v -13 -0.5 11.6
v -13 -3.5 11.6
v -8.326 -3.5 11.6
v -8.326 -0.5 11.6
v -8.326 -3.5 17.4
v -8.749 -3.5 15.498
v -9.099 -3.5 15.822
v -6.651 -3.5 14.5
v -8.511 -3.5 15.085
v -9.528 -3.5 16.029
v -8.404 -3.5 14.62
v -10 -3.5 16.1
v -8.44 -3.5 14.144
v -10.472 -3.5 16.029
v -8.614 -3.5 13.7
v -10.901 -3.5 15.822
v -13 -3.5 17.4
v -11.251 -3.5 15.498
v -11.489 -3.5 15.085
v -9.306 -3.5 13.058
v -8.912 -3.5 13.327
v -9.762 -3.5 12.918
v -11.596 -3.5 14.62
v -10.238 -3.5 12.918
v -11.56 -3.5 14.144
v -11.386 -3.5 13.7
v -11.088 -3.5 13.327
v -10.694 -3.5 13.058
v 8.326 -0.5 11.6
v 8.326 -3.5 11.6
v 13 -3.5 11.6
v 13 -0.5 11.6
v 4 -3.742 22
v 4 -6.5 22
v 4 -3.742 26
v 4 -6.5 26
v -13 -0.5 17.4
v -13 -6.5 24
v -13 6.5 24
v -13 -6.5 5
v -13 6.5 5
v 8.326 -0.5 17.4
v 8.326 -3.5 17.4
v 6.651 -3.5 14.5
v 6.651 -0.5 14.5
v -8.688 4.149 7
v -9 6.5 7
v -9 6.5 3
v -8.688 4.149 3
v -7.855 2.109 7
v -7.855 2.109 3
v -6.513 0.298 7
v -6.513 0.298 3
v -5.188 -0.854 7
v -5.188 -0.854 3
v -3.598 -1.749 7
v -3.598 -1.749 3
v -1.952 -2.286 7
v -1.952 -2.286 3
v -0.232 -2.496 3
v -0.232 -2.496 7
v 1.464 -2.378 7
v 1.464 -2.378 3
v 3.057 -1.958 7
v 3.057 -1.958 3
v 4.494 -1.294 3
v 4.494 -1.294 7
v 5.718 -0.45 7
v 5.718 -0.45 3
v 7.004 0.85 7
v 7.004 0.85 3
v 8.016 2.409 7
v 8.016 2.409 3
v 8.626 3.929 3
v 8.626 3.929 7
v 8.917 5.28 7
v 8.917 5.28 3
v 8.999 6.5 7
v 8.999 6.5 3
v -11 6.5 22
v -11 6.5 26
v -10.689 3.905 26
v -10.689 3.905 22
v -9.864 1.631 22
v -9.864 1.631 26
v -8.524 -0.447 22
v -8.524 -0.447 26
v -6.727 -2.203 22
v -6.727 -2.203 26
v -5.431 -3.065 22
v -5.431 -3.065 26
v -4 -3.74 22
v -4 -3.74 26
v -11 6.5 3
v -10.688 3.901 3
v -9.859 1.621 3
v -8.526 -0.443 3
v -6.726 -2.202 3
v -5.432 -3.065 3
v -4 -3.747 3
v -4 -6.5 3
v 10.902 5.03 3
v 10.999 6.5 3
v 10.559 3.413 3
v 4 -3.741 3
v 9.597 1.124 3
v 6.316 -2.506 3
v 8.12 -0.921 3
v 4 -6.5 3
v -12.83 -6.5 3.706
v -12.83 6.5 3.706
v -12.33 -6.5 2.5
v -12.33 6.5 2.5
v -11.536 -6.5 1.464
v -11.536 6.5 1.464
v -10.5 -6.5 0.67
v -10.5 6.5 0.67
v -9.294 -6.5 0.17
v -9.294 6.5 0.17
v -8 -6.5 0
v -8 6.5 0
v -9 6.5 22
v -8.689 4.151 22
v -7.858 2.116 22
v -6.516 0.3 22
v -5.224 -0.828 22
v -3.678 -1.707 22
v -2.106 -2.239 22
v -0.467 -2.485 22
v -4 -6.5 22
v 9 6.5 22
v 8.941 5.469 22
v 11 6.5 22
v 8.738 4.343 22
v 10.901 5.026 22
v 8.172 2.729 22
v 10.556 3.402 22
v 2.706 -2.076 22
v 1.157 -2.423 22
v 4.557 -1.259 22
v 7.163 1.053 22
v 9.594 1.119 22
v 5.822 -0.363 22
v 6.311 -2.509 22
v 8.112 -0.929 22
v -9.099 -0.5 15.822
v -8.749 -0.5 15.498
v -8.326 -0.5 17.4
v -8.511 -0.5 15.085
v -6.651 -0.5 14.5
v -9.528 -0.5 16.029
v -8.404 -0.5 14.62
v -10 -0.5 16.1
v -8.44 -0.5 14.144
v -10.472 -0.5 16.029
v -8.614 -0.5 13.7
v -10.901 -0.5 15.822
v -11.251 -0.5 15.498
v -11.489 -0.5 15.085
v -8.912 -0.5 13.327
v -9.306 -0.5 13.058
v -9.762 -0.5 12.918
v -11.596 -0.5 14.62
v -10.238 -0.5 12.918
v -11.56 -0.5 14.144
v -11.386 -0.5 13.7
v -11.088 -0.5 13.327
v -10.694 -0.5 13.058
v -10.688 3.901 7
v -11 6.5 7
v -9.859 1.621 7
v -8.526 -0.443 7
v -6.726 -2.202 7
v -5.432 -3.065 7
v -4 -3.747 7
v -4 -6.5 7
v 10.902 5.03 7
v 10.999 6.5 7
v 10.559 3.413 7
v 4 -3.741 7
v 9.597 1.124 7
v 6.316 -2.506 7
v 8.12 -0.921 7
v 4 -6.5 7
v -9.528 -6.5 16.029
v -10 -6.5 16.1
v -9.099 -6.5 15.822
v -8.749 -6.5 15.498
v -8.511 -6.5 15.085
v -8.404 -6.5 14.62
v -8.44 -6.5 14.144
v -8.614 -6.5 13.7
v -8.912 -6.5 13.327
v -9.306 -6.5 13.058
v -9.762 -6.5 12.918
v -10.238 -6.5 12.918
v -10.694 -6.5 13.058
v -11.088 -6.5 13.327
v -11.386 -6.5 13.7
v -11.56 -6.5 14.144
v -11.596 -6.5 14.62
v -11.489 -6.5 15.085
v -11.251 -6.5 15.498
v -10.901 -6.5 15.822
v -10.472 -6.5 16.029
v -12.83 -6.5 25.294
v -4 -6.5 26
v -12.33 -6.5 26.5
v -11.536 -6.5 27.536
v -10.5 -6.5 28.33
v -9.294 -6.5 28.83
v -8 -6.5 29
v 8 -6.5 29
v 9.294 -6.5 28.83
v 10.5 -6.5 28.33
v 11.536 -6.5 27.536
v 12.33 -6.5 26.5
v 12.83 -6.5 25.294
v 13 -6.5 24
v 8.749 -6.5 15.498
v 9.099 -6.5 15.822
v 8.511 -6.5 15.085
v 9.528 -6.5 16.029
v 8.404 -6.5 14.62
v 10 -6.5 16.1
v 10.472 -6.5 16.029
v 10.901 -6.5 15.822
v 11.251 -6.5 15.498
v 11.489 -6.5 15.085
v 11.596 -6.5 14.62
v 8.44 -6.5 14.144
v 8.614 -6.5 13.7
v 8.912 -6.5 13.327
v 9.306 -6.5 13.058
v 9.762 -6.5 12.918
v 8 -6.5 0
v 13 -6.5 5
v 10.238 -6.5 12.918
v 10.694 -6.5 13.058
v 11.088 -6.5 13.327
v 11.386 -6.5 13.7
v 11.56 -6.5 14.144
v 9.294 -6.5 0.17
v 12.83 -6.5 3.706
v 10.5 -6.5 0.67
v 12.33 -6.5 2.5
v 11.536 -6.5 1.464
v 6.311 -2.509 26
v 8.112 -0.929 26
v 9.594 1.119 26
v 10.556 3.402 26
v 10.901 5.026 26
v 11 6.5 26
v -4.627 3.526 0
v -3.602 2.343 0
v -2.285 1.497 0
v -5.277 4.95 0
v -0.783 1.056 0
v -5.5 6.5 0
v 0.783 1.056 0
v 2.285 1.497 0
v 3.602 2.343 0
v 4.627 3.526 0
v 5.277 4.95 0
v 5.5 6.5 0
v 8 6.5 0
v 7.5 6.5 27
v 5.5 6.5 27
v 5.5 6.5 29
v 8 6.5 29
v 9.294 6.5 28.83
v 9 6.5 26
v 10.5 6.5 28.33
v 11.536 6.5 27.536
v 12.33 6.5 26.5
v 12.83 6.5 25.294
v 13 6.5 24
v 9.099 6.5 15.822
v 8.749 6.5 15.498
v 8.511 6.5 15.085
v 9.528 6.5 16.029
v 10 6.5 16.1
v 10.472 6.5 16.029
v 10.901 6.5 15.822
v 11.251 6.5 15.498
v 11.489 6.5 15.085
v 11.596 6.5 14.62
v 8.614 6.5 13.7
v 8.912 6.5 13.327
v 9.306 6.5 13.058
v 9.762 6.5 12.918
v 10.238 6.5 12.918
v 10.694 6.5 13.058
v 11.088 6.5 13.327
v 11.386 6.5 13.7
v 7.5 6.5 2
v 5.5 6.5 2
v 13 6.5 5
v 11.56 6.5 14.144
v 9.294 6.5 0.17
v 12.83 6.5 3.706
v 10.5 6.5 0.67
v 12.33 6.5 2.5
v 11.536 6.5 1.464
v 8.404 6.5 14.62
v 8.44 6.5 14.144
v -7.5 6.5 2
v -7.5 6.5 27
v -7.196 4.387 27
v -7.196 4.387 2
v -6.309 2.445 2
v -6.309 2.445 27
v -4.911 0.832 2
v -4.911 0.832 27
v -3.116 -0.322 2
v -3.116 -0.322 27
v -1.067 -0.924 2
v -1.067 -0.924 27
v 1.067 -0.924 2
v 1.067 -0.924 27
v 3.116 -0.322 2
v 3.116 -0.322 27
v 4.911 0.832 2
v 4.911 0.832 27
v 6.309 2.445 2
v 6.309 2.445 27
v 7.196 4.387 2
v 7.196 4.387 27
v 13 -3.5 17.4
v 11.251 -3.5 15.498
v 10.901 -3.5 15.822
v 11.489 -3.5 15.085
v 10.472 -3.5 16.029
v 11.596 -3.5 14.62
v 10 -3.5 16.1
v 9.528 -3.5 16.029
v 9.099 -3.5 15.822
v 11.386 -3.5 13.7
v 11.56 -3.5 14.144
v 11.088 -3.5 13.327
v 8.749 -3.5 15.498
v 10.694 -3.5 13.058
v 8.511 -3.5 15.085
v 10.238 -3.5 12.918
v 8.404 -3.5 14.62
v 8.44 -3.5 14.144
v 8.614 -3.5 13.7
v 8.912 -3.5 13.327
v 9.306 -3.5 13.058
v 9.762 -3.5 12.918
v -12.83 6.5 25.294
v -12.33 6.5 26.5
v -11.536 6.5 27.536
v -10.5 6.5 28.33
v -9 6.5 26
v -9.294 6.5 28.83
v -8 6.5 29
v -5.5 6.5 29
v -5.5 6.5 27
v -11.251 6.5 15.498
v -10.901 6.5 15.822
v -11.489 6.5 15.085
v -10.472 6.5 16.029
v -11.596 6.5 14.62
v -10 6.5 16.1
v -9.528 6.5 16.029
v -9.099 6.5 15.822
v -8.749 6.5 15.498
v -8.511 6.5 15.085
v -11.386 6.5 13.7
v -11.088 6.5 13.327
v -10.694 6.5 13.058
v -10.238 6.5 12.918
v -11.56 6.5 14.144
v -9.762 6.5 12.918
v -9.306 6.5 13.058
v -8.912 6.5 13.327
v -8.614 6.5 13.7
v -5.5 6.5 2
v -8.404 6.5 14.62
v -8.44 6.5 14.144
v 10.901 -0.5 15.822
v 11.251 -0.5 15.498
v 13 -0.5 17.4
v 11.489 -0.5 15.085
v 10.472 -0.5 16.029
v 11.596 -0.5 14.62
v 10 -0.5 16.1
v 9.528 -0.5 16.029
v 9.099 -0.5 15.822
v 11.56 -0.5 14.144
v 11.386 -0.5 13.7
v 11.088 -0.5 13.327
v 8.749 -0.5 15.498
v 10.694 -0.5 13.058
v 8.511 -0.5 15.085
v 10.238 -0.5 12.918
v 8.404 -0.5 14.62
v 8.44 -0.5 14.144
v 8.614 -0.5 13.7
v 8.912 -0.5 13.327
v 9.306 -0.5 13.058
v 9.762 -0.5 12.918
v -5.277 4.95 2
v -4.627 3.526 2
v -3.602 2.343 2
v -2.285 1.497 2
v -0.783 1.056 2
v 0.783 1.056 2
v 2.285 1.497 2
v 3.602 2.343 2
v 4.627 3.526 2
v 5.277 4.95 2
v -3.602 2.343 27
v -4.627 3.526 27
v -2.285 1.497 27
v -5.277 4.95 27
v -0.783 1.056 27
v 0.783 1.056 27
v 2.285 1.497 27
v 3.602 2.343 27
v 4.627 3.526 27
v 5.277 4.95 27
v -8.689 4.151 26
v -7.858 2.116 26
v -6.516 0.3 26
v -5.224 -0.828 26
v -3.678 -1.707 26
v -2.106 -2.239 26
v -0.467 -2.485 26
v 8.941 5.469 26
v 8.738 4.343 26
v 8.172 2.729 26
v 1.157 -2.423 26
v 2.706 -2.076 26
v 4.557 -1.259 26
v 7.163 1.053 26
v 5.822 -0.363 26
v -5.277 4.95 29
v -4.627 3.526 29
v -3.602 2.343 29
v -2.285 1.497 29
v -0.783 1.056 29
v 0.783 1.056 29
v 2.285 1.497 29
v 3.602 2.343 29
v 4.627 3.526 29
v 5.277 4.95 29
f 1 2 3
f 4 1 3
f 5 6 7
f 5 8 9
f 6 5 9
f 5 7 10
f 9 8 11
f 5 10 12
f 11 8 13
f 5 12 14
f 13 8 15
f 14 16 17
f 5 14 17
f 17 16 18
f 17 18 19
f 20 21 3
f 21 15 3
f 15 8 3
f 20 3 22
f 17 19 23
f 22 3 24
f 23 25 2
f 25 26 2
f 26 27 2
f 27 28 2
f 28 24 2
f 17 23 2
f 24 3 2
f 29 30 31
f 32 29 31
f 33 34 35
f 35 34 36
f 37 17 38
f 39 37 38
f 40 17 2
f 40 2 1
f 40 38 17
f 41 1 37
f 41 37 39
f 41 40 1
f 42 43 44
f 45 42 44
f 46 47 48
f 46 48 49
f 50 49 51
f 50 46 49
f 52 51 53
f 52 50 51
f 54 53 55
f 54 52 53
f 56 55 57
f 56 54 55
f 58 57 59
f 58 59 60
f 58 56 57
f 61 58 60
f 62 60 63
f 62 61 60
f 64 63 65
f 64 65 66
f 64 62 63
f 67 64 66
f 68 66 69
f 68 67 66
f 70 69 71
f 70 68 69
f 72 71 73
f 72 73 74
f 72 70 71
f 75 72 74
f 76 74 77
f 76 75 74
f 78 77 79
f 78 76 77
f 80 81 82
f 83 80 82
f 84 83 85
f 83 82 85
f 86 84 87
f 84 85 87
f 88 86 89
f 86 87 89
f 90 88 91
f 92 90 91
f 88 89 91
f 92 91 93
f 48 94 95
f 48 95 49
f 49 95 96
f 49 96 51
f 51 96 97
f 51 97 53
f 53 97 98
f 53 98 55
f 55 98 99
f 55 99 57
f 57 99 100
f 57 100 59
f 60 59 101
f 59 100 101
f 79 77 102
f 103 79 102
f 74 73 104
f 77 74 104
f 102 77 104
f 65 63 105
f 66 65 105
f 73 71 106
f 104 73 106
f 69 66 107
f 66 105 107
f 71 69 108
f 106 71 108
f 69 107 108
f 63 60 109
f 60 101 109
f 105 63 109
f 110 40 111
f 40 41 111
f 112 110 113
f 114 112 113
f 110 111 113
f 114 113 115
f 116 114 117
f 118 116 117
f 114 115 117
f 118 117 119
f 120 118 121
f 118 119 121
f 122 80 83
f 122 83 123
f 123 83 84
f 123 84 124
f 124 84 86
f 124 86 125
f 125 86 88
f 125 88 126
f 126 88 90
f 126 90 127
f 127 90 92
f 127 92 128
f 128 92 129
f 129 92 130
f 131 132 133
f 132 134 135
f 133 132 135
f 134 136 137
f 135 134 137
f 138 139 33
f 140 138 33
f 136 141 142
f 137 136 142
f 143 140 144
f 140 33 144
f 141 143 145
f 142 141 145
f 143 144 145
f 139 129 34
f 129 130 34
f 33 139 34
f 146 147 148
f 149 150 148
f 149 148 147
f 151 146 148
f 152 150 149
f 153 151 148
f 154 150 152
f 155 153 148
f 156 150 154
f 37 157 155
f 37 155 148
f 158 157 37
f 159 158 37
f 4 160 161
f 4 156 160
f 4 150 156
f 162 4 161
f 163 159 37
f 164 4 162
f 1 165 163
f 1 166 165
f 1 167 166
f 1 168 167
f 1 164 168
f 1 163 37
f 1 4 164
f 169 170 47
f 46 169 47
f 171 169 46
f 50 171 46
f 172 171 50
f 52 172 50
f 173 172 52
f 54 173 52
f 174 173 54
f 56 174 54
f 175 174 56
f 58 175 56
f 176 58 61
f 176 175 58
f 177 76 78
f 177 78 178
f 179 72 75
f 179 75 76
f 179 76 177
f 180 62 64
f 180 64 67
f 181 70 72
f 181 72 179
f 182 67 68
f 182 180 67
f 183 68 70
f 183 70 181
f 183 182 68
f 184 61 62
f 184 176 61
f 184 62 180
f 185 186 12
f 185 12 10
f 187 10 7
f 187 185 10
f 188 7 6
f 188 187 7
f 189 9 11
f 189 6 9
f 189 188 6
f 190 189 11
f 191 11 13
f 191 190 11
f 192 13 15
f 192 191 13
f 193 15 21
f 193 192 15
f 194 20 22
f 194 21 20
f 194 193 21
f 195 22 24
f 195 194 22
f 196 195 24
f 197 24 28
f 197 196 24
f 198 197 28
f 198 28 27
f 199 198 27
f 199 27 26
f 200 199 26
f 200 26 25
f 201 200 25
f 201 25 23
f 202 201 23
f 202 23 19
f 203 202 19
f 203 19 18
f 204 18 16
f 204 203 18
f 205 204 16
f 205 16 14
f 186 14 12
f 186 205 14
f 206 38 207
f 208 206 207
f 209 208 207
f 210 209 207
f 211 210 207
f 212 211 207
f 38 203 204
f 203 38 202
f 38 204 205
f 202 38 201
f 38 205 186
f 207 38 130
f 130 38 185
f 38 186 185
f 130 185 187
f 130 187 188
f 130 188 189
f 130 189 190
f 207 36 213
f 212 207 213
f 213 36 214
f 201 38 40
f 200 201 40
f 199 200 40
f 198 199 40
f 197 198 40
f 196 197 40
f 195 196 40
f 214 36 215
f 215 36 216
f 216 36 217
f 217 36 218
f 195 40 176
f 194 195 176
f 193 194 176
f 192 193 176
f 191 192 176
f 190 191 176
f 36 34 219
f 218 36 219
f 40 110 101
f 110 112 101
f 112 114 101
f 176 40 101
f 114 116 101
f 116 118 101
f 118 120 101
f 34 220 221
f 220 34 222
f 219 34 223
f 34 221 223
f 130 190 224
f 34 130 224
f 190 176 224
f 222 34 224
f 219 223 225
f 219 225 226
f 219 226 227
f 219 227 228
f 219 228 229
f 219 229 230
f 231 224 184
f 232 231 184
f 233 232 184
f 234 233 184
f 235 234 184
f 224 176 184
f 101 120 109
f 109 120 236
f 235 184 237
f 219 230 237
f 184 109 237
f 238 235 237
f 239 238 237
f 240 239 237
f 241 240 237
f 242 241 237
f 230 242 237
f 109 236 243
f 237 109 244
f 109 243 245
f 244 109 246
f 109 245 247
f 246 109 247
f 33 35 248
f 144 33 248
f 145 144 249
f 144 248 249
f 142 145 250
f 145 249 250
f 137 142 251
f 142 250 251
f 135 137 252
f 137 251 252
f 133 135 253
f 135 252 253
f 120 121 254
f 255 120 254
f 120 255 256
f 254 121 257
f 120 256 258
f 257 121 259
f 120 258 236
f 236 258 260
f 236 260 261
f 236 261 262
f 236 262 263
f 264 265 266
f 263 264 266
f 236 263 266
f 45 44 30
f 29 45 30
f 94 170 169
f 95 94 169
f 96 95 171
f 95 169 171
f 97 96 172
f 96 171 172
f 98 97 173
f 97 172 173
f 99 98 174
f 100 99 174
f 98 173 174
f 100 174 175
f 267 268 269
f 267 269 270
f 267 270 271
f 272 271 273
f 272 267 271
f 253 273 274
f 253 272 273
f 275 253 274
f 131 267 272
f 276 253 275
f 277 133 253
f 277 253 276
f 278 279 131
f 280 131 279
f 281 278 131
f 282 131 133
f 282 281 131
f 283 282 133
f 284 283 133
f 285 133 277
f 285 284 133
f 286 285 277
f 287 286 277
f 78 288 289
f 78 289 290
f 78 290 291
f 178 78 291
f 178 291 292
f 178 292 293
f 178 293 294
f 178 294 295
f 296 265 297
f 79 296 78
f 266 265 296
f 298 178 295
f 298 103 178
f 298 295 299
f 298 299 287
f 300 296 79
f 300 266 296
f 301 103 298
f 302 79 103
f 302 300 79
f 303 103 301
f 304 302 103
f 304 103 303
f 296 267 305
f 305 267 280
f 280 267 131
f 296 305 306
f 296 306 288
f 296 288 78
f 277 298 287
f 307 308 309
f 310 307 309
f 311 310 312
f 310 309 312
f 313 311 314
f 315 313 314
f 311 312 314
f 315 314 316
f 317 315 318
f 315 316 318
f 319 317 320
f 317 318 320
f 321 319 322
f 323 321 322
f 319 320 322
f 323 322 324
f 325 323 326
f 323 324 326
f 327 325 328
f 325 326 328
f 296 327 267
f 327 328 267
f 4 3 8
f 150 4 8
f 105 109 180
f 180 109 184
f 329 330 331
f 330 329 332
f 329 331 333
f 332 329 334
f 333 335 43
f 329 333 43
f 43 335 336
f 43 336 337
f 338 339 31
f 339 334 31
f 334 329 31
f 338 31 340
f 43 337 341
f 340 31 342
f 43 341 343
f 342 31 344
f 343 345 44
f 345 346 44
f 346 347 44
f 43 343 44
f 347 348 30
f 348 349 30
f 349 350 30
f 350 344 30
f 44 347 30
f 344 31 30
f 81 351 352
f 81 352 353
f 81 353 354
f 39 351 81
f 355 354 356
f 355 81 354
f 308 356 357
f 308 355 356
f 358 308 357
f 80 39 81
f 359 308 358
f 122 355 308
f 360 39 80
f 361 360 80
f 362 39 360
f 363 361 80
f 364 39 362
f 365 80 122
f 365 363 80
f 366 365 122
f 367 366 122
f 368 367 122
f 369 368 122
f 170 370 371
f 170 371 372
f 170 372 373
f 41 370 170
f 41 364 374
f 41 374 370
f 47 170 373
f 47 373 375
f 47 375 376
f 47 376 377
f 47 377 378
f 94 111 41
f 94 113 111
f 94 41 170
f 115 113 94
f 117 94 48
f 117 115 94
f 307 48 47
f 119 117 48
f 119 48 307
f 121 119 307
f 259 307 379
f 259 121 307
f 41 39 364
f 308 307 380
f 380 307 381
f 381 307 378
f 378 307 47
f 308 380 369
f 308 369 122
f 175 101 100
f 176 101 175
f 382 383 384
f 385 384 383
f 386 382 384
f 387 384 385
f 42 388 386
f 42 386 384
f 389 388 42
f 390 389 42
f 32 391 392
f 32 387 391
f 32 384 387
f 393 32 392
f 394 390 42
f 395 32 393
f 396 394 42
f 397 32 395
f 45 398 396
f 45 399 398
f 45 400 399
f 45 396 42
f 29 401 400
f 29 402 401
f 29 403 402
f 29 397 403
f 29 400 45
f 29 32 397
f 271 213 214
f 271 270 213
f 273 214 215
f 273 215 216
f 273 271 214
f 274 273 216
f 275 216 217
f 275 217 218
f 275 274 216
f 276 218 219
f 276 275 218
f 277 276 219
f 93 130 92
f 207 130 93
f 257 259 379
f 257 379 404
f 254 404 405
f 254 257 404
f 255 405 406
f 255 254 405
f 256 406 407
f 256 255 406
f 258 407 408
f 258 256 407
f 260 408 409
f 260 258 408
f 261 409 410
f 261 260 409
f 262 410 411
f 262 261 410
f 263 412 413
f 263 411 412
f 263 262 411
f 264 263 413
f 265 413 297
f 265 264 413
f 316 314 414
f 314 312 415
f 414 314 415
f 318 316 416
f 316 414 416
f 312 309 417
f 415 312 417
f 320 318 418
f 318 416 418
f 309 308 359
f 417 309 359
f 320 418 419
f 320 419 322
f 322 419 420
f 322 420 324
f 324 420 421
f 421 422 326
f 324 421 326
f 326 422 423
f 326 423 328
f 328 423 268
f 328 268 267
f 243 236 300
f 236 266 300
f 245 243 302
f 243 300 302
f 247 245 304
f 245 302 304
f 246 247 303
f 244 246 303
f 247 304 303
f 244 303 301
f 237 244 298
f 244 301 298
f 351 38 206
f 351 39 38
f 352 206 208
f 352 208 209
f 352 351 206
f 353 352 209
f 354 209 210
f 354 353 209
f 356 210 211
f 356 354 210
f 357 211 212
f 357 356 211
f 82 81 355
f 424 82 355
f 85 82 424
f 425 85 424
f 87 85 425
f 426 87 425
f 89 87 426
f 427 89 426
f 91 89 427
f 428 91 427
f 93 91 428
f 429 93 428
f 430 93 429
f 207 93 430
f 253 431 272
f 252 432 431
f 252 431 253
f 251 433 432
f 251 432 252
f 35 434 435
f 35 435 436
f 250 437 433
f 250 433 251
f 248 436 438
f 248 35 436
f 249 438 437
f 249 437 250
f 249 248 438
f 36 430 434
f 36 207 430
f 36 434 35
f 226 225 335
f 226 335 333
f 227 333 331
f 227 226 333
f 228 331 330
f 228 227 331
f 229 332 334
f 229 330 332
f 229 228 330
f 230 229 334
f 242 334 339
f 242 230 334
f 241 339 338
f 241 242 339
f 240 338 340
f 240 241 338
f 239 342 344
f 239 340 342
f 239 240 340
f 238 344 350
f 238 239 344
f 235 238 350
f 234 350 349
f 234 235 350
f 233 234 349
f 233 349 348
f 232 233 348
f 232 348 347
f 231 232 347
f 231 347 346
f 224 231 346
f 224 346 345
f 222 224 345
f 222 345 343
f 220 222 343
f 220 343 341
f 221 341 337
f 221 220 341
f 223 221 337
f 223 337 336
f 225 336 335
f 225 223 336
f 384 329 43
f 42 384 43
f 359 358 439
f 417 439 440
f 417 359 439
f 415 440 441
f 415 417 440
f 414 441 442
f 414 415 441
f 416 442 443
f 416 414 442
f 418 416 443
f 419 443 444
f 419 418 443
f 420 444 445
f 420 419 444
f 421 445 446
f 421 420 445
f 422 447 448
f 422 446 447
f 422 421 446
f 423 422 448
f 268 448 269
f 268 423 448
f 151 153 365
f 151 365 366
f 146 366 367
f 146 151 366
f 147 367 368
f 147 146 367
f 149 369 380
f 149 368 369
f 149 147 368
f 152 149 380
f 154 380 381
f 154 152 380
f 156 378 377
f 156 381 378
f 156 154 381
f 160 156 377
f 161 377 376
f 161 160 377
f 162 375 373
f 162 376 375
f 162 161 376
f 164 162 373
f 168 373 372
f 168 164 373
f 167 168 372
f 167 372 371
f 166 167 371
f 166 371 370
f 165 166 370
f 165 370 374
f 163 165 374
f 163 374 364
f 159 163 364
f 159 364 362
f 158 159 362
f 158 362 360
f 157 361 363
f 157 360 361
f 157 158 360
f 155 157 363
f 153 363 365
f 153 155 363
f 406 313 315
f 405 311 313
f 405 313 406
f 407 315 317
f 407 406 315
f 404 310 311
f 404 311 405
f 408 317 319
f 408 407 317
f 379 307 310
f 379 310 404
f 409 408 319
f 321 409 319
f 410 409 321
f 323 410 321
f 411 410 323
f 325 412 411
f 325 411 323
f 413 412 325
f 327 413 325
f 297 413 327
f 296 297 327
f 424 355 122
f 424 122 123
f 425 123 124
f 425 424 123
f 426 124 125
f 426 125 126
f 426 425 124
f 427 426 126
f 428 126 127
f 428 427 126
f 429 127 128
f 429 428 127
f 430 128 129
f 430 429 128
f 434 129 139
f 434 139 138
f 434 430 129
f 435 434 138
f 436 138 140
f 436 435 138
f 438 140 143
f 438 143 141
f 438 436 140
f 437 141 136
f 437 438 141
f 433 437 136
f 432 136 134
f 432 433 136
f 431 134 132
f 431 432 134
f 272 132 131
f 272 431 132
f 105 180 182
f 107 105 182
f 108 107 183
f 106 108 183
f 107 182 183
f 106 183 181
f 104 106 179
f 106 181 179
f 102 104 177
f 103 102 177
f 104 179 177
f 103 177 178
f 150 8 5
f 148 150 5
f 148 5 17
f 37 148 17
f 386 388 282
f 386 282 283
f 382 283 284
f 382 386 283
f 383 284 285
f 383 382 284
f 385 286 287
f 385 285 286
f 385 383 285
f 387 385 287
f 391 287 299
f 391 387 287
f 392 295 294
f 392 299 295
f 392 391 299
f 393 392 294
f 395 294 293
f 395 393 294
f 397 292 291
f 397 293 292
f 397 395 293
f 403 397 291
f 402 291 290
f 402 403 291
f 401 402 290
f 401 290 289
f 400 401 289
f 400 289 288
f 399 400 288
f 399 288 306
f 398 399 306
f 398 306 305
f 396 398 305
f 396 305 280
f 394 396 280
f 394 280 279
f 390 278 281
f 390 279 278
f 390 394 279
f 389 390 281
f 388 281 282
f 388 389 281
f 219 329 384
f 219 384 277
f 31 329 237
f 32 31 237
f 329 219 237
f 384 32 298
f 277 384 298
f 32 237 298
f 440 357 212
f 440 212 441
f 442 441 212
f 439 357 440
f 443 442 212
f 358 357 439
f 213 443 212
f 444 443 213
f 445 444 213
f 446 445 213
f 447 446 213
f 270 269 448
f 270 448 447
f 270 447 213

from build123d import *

# Parameters (mm, degrees)
ESBO_O1_W                  = 26
ESBO_O1_H                  = 13
RESSALTO_EXTRUS_O1_DEPTH   = 29
CORTE_EXTRUS_O1_DEPTH      = 33.438403167
CORTE_EXTRUS_O1_DEPTH_BACK = 33.438403167
ESBO_O2_R                  = 5.5
ESBO_O3_R                  = 7.5
CORTE_EXTRUS_O2_DEPTH      = 25
CORTE_EXTRUS_O3_DEPTH      = 35.336569427
CORTE_EXTRUS_O3_DEPTH_BACK = 35.336569427
ESBO_O4_R                  = 1.6
CORTE_EXTRUS_O4_DEPTH      = 3
ESBO_O9_W                  = 8
ESBO_O9_H                  = 4
CORTE_EXTRUS_O5_DEPTH      = 3
FILETE1_R                  = 5


with BuildPart() as part:
    # Esboço1 → Ressalto-extrusão1 (new body)
    with BuildSketch(Plane.XY):
        Rectangle(ESBO_O1_W, ESBO_O1_H)
    extrude(amount=RESSALTO_EXTRUS_O1_DEPTH)

    # Esboço2 → Corte-extrusão1 (cut, two sides: drawn at the far end of the back side and taken through both)
    with BuildSketch(Plane.XY.offset(29).offset(-CORTE_EXTRUS_O1_DEPTH_BACK)):
        with Locations((0, 6.5)):
            Circle(ESBO_O2_R)
    extrude(amount=CORTE_EXTRUS_O1_DEPTH + CORTE_EXTRUS_O1_DEPTH_BACK, mode=Mode.SUBTRACT)

    # Esboço3 → Corte-extrusão2 (cut)
    with BuildSketch(Plane.XY.offset(27)):
        with Locations((0, 6.5)):
            Circle(ESBO_O3_R)
    extrude(amount=-CORTE_EXTRUS_O2_DEPTH, mode=Mode.SUBTRACT)

    # Esboço4 → Corte-extrusão3 (cut, two sides: drawn at the far end of the back side and taken through both)
    with BuildSketch(Plane(origin=(0, 6.5, 0), x_dir=(1, 0, 0), z_dir=(0, 1, 0)).offset(-CORTE_EXTRUS_O3_DEPTH_BACK)):
        with Locations(Location((-10, -14.5, 0), (0, 0, 270))):
            Circle(ESBO_O4_R)
        with Locations(Location((10, -14.5, 0), (0, 0, 270))):
            Circle(ESBO_O4_R)
    extrude(amount=CORTE_EXTRUS_O3_DEPTH + CORTE_EXTRUS_O3_DEPTH_BACK, mode=Mode.SUBTRACT)

    # Varredura de corte3: read off the stored shape, not the designer's step
    # Varredura de corte3: loft between two sections, ruled curve by curve
    varredura_de_corte3_from = [
        Edge.make_bspline([(-10.775531387, 11.14102753, 3), (-10.815047893, 10.387007675, 3), (-10.859579119, 9.537232339, 3), (-10.942482774, 7.955474229, 3), (-11.000003483, 7.230191203, 3), (-10.999993175, 5.06927711, 3), (-10.717078713, 3.385508213, 3), (-9.067866438, -0.006108266, 3), (-7.679635371, -1.685716419, 3), (-4.830903728, -3.44525385, 3), (-3.774716833, -3.895333549, 3), (-1.552511027, -4.449938605, 3), (-0.403453822, -4.550209028, 3), (2.969944564, -4.328615808, 3), (5.023571546, -3.476580102, 3), (8.13506471, -1.154366891, 3), (9.189674801, 0.267167465, 3), (10.533085234, 2.985384839, 3), (10.837160801, 4.285623822, 3), (11.004780041, 6.01871971, 3), (11.006990461, 6.575860832, 3), (10.96949773, 7.517101654, 3), (10.943022714, 7.945129378, 3), (10.873144208, 9.27841043, 3), (10.824758408, 10.201720017, 3), (10.775531387, 11.14102753, 3)], [0, 0, 0, 0, 0.056576928, 0.056576928, 0.113153857, 0.113153857, 0.224009625, 0.224009625, 0.334865393, 0.334865393, 0.390293276, 0.390293276, 0.44572116, 0.44572116, 0.556576928, 0.556576928, 0.667432696, 0.667432696, 0.778288464, 0.778288464, 0.833716348, 0.833716348, 0.889144232, 0.889144232, 1, 1, 1, 1], 3),
        Edge.make_bspline([(-8.778272317, 11.036355618, 3), (-8.818366558, 10.271311923, 3), (-8.86155068, 9.447238277, 3), (-8.945993073, 7.836124466, 3), (-9.000002401, 7.107268908, 3), (-8.999995296, 5.310128738, 3), (-8.764237068, 3.942975251, 3), (-7.423445328, 1.185624705, 3), (-6.27357029, -0.203437636, 3), (-3.957441466, -1.63400923, 3), (-3.084493861, -2.006248941, 3), (-1.274147115, -2.45806464, 3), (-0.32387933, -2.540671478, 3), (2.417516141, -2.360593842, 3), (4.119219834, -1.655921663, 3), (6.646937102, 0.230601396, 3), (7.51801706, 1.398774697, 3), (8.618786605, 3.626040825, 3), (8.867342653, 4.694186327, 3), (9.003623581, 6.103250891, 3), (9.006690622, 6.5435831, 3), (8.972969022, 7.390126226, 3), (8.946060492, 7.834793966, 3), (8.875291444, 9.185065517, 3), (8.82794518, 10.088540932, 3), (8.778272317, 11.036355618, 3)], [0, 0, 0, 0, 0.056576928, 0.056576928, 0.113153857, 0.113153857, 0.224009625, 0.224009625, 0.334865393, 0.334865393, 0.390293276, 0.390293276, 0.44572116, 0.44572116, 0.556576928, 0.556576928, 0.667432696, 0.667432696, 0.778288464, 0.778288464, 0.833716348, 0.833716348, 0.889144232, 0.889144232, 1, 1, 1, 1], 3),
        Edge.make_line((-8.778272317, 11.036355618, 3), (-10.775531387, 11.14102753, 3)),
        Edge.make_line((8.778272317, 11.036355618, 3), (10.775531387, 11.14102753, 3)),
    ]
    varredura_de_corte3_to = [
        Edge.make_bspline([(-10.775531387, 11.14102753, 7), (-10.815047893, 10.387007675, 7), (-10.859579119, 9.537232339, 7), (-10.942482774, 7.955474229, 7), (-11.000003483, 7.230191203, 7), (-10.999993175, 5.06927711, 7), (-10.717078713, 3.385508213, 7), (-9.067866438, -0.006108266, 7), (-7.679635371, -1.685716419, 7), (-4.830903728, -3.44525385, 7), (-3.774716833, -3.895333549, 7), (-1.552511027, -4.449938605, 7), (-0.403453822, -4.550209028, 7), (2.969944564, -4.328615808, 7), (5.023571546, -3.476580102, 7), (8.13506471, -1.154366891, 7), (9.189674801, 0.267167465, 7), (10.533085234, 2.985384839, 7), (10.837160801, 4.285623822, 7), (11.004780041, 6.01871971, 7), (11.006990461, 6.575860832, 7), (10.96949773, 7.517101654, 7), (10.943022714, 7.945129378, 7), (10.873144208, 9.27841043, 7), (10.824758408, 10.201720017, 7), (10.775531387, 11.14102753, 7)], [0, 0, 0, 0, 0.056576928, 0.056576928, 0.113153857, 0.113153857, 0.224009625, 0.224009625, 0.334865393, 0.334865393, 0.390293276, 0.390293276, 0.44572116, 0.44572116, 0.556576928, 0.556576928, 0.667432696, 0.667432696, 0.778288464, 0.778288464, 0.833716348, 0.833716348, 0.889144232, 0.889144232, 1, 1, 1, 1], 3),
        Edge.make_bspline([(-8.778272317, 11.036355618, 7), (-8.818366558, 10.271311923, 7), (-8.86155068, 9.447238277, 7), (-8.945993073, 7.836124466, 7), (-9.000002401, 7.107268908, 7), (-8.999995296, 5.310128738, 7), (-8.764237068, 3.942975251, 7), (-7.423445328, 1.185624705, 7), (-6.27357029, -0.203437636, 7), (-3.957441466, -1.63400923, 7), (-3.084493861, -2.006248941, 7), (-1.274147115, -2.45806464, 7), (-0.32387933, -2.540671478, 7), (2.417516141, -2.360593842, 7), (4.119219834, -1.655921663, 7), (6.646937102, 0.230601396, 7), (7.51801706, 1.398774697, 7), (8.618786605, 3.626040825, 7), (8.867342653, 4.694186327, 7), (9.003623581, 6.103250891, 7), (9.006690622, 6.5435831, 7), (8.972969022, 7.390126226, 7), (8.946060492, 7.834793966, 7), (8.875291444, 9.185065517, 7), (8.82794518, 10.088540932, 7), (8.778272317, 11.036355618, 7)], [0, 0, 0, 0, 0.056576928, 0.056576928, 0.113153857, 0.113153857, 0.224009625, 0.224009625, 0.334865393, 0.334865393, 0.390293276, 0.390293276, 0.44572116, 0.44572116, 0.556576928, 0.556576928, 0.667432696, 0.667432696, 0.778288464, 0.778288464, 0.833716348, 0.833716348, 0.889144232, 0.889144232, 1, 1, 1, 1], 3),
        Edge.make_line((-8.778272317, 11.036355618, 7), (-10.775531387, 11.14102753, 7)),
        Edge.make_line((8.778272317, 11.036355618, 7), (10.775531387, 11.14102753, 7)),
    ]
    varredura_de_corte3 = Solid(Shell([*[Face.make_surface_from_curves(varredura_de_corte3_from[k], varredura_de_corte3_to[k]) for k in range(4)], Face(Wire(varredura_de_corte3_from)), Face(Wire(varredura_de_corte3_to))]))
    add(varredura_de_corte3, mode=Mode.SUBTRACT)

    # Varredura de corte3 2: loft between two sections, ruled curve by curve
    varredura_de_corte3_2_from = [
        Edge.make_bspline([(-10.775531387, 11.14102753, 22), (-10.815050253, 10.386962648, 22), (-10.859635544, 9.536156226, 22), (-10.942604964, 7.953142141, 22), (-11.000003387, 7.227604876, 22), (-10.999993448, 5.09243912, 22), (-10.726075216, 3.44374676, 22), (-9.146415207, 0.117814577, 22), (-7.826638231, -1.531050563, 22), (-4.171497206, -3.909251659, 22), (-1.912358031, -4.556779213, 22), (2.517456834, -4.434897746, 22), (4.570919991, -3.689422793, 22), (7.764052722, -1.527285148, 22), (8.887440792, -0.158899703, 22), (10.364225069, 2.511206921, 22), (10.732123337, 3.816518914, 22), (10.975605623, 5.5614094, 22), (11.004902153, 6.119453759, 22), (10.993656399, 7.13678057, 22), (10.963259766, 7.559009248, 22), (10.895302463, 8.855554069, 22), (10.847393897, 9.769809145, 22), (10.799382035, 10.685930053, 22)], [0, 0, 0, 0, 0.057220999, 0.057220999, 0.114441998, 0.114441998, 0.225136749, 0.225136749, 0.335831499, 0.335831499, 0.446526249, 0.446526249, 0.557220999, 0.557220999, 0.667915749, 0.667915749, 0.7786105, 0.7786105, 0.833957875, 0.833957875, 0.88930525, 0.88930525, 1, 1, 1, 1], 3),
        Edge.make_bspline([(-8.778272317, 11.036355618, 22), (-8.818364203, 10.271356871, 22), (-8.861613386, 9.446042366, 22), (-8.946108983, 7.833912176, 22), (-9.000002332, 7.104831646, 22), (-8.999995488, 5.329945493, 22), (-8.772011309, 3.991285732, 22), (-7.487299037, 1.286355363, 22), (-6.385007619, -0.082964565, 22), (-3.431648648, -2.004555434, 22), (-1.541287594, -2.5458131, 22), (2.036368433, -2.447377138, 22), (3.749427608, -1.830311698, 22), (6.342822793, -0.074267526, 22), (7.271131746, 1.051066146, 22), (8.480231231, 3.237185214, 22), (8.780527991, 4.302274211, 22), (8.980191062, 5.733137414, 22), (9.004131059, 6.178194136, 22), (8.994672137, 7.033801275, 22), (8.966591972, 7.443057915, 22), (8.896860843, 8.773440999, 22), (8.851022767, 9.64819435, 22), (8.802122965, 10.58125814, 22)], [0, 0, 0, 0, 0.057220999, 0.057220999, 0.114441998, 0.114441998, 0.225136749, 0.225136749, 0.335831499, 0.335831499, 0.446526249, 0.446526249, 0.557220999, 0.557220999, 0.667915749, 0.667915749, 0.7786105, 0.7786105, 0.833957875, 0.833957875, 0.88930525, 0.88930525, 1, 1, 1, 1], 3),
        Edge.make_line((-8.778272317, 11.036355618, 22), (-10.775531387, 11.14102753, 22)),
        Edge.make_line((8.802122965, 10.58125814, 22), (10.799382035, 10.685930053, 22)),
    ]
    varredura_de_corte3_2_to = [
        Edge.make_bspline([(-10.775531387, 11.14102753, 26), (-10.815050253, 10.386962648, 26), (-10.859635544, 9.536156226, 26), (-10.942604964, 7.953142141, 26), (-11.000003387, 7.227604876, 26), (-10.999993448, 5.09243912, 26), (-10.726075216, 3.44374676, 26), (-9.146415207, 0.117814577, 26), (-7.826638231, -1.531050563, 26), (-4.171497206, -3.909251659, 26), (-1.912358031, -4.556779213, 26), (2.517456834, -4.434897746, 26), (4.570919991, -3.689422793, 26), (7.764052722, -1.527285148, 26), (8.887440792, -0.158899703, 26), (10.364225069, 2.511206921, 26), (10.732123337, 3.816518914, 26), (10.975605623, 5.5614094, 26), (11.004902153, 6.119453759, 26), (10.993656399, 7.13678057, 26), (10.963259766, 7.559009248, 26), (10.895302463, 8.855554069, 26), (10.847393897, 9.769809145, 26), (10.799382035, 10.685930053, 26)], [0, 0, 0, 0, 0.057220999, 0.057220999, 0.114441998, 0.114441998, 0.225136749, 0.225136749, 0.335831499, 0.335831499, 0.446526249, 0.446526249, 0.557220999, 0.557220999, 0.667915749, 0.667915749, 0.7786105, 0.7786105, 0.833957875, 0.833957875, 0.88930525, 0.88930525, 1, 1, 1, 1], 3),
        Edge.make_bspline([(-8.778272317, 11.036355618, 26), (-8.818364203, 10.271356871, 26), (-8.861613386, 9.446042366, 26), (-8.946108983, 7.833912176, 26), (-9.000002332, 7.104831646, 26), (-8.999995488, 5.329945493, 26), (-8.772011309, 3.991285732, 26), (-7.487299037, 1.286355363, 26), (-6.385007619, -0.082964565, 26), (-3.431648648, -2.004555434, 26), (-1.541287594, -2.5458131, 26), (2.036368433, -2.447377138, 26), (3.749427608, -1.830311698, 26), (6.342822793, -0.074267526, 26), (7.271131746, 1.051066146, 26), (8.480231231, 3.237185214, 26), (8.780527991, 4.302274211, 26), (8.980191062, 5.733137414, 26), (9.004131059, 6.178194136, 26), (8.994672137, 7.033801275, 26), (8.966591972, 7.443057915, 26), (8.896860843, 8.773440999, 26), (8.851022767, 9.64819435, 26), (8.802122965, 10.58125814, 26)], [0, 0, 0, 0, 0.057220999, 0.057220999, 0.114441998, 0.114441998, 0.225136749, 0.225136749, 0.335831499, 0.335831499, 0.446526249, 0.446526249, 0.557220999, 0.557220999, 0.667915749, 0.667915749, 0.7786105, 0.7786105, 0.833957875, 0.833957875, 0.88930525, 0.88930525, 1, 1, 1, 1], 3),
        Edge.make_line((-8.778272317, 11.036355618, 26), (-10.775531387, 11.14102753, 26)),
        Edge.make_line((8.802122965, 10.58125814, 26), (10.799382035, 10.685930053, 26)),
    ]
    varredura_de_corte3_2 = Solid(Shell([*[Face.make_surface_from_curves(varredura_de_corte3_2_from[k], varredura_de_corte3_2_to[k]) for k in range(4)], Face(Wire(varredura_de_corte3_2_from)), Face(Wire(varredura_de_corte3_2_to))]))
    add(varredura_de_corte3_2, mode=Mode.SUBTRACT)

    # Esboço8 → Corte-extrusão4 (cut)
    with BuildSketch(Plane(origin=(0, -3.5, 0), x_dir=(-1, 0, 0), z_dir=(0, -1, 0))):
        Polygon((-11.674315781, -11.6), (-15.702583778, -11.6), (-15.702583778, -17.4), (-11.674315781, -17.4), (-8.325684219, -17.4), (-6.651368439, -14.5), (-8.325684219, -11.6), align=None)
        Polygon((11.674315781, -11.6), (8.325684219, -11.6), (6.651368439, -14.5), (8.325684219, -17.4), (11.674315781, -17.4), (15.292356459, -17.4), (15.292356459, -11.6), align=None)
    extrude(amount=-CORTE_EXTRUS_O4_DEPTH, mode=Mode.SUBTRACT)

    # Esboço9 → Corte-extrusão5 (cut)
    with BuildSketch(Plane.XZ.offset(6.5)):
        with Locations((0, 24)):
            Rectangle(ESBO_O9_W, ESBO_O9_H)
        with Locations((0, 5)):
            Rectangle(ESBO_O9_W, ESBO_O9_H)
    extrude(amount=-CORTE_EXTRUS_O5_DEPTH, mode=Mode.SUBTRACT)

    # Filete1
    filete1_edges = [part.edges().sort_by_distance(p)[0] for p in [
        (-13, 0, 29),
        (13, 0, 29),
        (-13, 0, 0),
        (13, 0, 0),
    ]]
    fillet(filete1_edges, radius=FILETE1_R)


solid = part.part
